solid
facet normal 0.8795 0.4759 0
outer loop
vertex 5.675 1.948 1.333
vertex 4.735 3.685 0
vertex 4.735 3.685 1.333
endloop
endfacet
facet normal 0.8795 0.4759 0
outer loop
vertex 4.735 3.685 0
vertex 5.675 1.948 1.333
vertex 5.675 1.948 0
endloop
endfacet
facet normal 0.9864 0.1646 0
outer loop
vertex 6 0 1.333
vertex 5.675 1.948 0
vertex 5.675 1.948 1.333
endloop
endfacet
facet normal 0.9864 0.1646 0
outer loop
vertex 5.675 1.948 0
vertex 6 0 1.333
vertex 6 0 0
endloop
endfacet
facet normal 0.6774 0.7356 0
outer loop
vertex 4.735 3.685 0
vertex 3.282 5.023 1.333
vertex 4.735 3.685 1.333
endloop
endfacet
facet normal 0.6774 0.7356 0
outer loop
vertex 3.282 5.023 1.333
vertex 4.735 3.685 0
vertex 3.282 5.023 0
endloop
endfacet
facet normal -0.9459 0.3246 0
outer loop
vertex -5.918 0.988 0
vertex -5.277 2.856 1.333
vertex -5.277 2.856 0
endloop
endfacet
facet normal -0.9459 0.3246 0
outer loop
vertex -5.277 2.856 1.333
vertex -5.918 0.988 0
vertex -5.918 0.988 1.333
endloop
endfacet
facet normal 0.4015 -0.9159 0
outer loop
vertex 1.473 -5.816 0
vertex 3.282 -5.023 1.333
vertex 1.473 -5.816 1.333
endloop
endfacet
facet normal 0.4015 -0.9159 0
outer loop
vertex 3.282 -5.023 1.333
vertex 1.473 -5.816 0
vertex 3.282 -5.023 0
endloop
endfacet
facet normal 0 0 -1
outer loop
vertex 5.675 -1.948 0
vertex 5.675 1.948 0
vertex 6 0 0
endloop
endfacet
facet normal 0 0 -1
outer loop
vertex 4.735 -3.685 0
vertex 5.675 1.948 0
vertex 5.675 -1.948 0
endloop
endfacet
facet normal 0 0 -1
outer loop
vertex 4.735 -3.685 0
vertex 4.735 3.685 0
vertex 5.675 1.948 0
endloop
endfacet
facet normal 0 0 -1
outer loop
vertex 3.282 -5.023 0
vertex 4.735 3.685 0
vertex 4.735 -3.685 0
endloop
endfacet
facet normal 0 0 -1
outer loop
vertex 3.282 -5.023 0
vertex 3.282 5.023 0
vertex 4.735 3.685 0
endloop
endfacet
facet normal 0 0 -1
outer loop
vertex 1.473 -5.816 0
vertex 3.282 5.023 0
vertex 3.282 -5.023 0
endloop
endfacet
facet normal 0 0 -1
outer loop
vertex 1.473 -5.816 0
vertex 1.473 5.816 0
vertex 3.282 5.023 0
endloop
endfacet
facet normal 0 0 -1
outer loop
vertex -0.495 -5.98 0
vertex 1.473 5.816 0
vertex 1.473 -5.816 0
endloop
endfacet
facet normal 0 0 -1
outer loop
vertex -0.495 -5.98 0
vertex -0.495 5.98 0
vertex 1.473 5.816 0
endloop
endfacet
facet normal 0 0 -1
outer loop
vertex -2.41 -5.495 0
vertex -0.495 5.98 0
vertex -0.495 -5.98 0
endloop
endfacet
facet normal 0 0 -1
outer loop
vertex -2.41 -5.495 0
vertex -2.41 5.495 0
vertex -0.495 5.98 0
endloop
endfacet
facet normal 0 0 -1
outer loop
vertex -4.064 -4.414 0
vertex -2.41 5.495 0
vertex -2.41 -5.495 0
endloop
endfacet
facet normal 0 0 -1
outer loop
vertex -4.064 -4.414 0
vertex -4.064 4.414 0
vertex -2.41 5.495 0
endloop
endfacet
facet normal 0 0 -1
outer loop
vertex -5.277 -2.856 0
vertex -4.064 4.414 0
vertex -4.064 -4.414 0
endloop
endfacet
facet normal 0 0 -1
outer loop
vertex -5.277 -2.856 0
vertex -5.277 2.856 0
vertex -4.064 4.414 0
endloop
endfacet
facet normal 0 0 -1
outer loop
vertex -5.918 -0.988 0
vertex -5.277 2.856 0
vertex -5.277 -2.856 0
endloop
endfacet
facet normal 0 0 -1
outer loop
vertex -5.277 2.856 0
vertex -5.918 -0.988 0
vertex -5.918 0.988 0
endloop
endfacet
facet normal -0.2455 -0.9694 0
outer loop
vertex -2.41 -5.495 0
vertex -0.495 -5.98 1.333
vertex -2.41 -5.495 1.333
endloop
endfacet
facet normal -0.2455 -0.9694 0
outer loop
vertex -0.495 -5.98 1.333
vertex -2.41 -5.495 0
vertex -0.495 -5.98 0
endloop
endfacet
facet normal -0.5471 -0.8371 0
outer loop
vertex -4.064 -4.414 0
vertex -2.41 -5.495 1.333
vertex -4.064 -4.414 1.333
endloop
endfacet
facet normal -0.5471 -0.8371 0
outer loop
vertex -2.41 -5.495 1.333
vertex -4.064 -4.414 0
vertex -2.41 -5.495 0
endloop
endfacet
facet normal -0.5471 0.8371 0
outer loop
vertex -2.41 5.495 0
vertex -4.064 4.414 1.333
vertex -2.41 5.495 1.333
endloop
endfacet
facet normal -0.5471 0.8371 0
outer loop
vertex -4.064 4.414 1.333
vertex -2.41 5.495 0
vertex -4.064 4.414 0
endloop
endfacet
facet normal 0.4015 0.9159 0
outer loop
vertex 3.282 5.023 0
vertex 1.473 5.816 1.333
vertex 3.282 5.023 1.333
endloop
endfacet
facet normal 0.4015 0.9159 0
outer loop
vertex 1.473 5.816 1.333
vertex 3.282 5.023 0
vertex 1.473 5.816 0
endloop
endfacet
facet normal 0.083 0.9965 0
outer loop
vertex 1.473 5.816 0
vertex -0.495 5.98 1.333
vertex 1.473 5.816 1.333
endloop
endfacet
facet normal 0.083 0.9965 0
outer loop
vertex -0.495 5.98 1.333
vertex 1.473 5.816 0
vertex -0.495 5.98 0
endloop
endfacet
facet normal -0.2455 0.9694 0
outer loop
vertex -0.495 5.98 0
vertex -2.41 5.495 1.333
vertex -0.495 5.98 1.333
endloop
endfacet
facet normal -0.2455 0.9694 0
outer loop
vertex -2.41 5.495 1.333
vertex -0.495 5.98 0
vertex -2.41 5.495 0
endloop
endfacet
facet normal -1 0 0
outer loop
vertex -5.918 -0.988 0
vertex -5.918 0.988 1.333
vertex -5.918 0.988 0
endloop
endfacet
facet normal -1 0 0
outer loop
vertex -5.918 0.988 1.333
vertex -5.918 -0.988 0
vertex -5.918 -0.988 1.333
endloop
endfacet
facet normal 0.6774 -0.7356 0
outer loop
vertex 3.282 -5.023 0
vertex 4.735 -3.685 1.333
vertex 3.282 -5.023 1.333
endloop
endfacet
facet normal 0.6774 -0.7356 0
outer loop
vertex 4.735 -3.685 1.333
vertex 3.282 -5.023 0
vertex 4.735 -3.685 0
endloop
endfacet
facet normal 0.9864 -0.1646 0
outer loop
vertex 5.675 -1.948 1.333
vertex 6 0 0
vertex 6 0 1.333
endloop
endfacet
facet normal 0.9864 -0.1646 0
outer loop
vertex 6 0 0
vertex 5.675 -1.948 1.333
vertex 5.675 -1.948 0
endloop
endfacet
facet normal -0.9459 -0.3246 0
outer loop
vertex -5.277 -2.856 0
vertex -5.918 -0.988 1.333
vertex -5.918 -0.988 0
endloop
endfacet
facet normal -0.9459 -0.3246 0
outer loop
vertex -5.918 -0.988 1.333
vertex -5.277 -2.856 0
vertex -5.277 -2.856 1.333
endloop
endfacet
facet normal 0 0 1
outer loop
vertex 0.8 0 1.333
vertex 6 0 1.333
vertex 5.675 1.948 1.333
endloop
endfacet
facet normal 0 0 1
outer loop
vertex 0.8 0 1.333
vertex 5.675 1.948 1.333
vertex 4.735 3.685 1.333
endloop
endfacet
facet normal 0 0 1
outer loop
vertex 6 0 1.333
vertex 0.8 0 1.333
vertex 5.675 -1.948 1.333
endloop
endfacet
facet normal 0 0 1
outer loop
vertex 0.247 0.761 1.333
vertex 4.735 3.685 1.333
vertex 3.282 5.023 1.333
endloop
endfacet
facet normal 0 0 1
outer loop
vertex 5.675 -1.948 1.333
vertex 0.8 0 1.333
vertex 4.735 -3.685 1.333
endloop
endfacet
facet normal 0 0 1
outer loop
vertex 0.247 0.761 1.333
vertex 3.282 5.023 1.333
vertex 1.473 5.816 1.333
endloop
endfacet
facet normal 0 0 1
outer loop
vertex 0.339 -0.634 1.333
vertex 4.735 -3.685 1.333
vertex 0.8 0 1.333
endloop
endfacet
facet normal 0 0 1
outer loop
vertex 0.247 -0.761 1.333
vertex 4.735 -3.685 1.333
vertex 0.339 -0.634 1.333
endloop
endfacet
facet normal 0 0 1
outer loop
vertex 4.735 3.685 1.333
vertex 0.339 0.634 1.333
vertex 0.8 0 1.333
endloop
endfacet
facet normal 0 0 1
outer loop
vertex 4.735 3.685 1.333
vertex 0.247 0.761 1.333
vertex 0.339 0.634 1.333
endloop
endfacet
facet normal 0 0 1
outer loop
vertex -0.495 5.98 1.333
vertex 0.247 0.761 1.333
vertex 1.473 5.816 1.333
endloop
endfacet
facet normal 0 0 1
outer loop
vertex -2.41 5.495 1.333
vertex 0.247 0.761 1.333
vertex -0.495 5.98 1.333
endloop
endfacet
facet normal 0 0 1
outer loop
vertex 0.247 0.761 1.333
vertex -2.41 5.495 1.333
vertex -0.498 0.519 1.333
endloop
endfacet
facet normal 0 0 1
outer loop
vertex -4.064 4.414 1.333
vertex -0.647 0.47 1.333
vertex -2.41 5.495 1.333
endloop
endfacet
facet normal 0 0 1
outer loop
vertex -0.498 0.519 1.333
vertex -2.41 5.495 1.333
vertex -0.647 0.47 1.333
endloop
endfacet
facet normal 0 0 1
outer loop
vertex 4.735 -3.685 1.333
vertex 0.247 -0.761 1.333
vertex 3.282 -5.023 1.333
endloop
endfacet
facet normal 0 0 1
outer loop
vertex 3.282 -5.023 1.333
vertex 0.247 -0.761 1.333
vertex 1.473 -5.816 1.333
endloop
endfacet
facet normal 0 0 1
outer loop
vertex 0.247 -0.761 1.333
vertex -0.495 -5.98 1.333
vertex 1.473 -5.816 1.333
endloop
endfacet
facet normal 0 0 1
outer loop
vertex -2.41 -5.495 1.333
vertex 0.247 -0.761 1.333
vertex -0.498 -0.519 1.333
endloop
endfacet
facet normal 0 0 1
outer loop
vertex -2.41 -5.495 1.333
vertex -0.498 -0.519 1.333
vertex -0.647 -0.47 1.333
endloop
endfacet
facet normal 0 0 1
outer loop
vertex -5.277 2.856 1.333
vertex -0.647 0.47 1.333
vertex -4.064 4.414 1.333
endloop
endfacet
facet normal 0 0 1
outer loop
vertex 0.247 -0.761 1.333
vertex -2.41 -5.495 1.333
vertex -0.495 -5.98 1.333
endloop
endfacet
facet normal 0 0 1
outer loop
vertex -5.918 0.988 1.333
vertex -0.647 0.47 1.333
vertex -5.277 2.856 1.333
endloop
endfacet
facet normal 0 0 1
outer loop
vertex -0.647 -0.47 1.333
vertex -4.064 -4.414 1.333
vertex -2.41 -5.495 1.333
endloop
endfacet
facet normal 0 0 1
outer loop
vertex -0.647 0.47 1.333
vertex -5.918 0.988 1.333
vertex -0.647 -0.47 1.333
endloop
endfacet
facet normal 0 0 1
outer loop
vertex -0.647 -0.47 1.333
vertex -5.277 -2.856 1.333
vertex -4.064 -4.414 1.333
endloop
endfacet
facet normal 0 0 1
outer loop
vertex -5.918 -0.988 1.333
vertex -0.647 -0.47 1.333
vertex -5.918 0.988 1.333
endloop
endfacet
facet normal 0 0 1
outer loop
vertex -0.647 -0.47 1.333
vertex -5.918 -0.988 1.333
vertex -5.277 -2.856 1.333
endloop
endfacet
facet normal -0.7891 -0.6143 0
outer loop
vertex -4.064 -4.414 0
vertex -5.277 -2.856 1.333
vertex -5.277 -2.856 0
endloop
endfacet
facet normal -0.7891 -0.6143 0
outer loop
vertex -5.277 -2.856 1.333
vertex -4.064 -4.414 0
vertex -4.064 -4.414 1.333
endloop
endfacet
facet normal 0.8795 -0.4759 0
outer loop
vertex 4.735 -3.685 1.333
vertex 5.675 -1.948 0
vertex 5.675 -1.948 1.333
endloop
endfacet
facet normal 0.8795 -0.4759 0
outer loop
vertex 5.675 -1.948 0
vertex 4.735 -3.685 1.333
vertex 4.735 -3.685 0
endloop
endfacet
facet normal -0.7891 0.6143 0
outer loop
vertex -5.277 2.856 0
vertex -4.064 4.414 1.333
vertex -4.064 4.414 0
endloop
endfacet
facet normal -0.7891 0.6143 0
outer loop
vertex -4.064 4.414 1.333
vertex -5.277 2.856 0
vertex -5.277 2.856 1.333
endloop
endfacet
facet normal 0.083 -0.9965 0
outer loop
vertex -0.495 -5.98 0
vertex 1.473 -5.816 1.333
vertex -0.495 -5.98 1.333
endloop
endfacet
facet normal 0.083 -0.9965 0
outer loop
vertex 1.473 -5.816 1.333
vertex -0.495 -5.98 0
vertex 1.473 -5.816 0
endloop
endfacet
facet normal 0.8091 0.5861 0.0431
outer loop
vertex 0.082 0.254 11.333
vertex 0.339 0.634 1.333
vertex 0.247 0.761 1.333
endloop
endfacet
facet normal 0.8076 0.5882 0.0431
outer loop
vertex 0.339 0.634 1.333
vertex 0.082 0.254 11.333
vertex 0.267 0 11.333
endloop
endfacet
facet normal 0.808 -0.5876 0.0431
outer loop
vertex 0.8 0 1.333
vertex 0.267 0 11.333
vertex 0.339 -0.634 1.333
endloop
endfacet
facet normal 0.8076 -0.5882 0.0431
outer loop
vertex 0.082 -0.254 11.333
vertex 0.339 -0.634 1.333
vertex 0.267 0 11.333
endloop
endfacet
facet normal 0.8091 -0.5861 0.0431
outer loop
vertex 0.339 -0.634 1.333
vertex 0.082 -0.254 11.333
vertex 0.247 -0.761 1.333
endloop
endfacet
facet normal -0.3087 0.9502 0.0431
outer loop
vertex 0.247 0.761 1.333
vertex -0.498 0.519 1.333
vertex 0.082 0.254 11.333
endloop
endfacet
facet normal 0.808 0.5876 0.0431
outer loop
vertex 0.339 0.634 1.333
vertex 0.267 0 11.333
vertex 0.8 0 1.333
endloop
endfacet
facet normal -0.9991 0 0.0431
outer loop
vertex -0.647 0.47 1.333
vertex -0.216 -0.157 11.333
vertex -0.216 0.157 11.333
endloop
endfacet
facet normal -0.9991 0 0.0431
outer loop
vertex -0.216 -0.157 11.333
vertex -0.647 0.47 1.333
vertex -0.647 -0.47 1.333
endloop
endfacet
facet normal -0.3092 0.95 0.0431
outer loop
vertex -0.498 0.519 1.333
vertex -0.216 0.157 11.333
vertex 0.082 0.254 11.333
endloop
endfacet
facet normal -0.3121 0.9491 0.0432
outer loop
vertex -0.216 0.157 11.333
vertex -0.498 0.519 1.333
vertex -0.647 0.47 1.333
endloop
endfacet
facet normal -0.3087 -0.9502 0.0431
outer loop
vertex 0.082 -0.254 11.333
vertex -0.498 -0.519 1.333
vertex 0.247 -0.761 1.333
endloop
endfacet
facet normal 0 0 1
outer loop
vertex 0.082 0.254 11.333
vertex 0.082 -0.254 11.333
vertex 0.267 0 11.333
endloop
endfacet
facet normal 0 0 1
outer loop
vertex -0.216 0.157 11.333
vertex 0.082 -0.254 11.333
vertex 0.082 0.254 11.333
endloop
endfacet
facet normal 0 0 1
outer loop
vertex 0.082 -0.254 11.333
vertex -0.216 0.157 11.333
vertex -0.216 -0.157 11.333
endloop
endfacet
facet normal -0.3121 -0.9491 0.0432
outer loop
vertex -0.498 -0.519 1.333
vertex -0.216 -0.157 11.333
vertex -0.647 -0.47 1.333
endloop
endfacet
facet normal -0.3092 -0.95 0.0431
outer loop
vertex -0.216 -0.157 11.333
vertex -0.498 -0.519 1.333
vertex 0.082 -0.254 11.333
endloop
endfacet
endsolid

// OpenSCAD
// This is mrbenbritton's cookie cutter script
// http://www.thingiverse.com/thing:28882

inputfile = "unicorn-contour.dxf";

wallThick = 2;
cutterMinimum = 0.4;
baseHeight = 4;
height = 10;
flangeWidth = 6;

//cube([7,5,1], center=true);

minkowski(){
	outline();
	cylinder(r1 = wallThick/3, r2 = cutterMinimum/3, h = height);
};
//%cube([.5, .5, height*3], true);

flange();

module flange(){
	difference(){
	minkowski(){
	baseShape(baseHeight/3);
	cylinder(r = flangeWidth, h = baseHeight/3);
	}
	translate([0,0,-0.01])baseShape(baseHeight*1.1);
	};
}



module outline(){
	difference(){
	minkowski(){
	baseShape(baseHeight/3);
	cylinder(r = cutterMinimum/3, h = baseHeight/3);
	}
	translate([0,0,-0.01])baseShape(baseHeight*1.1);
	};
};

module baseShape(H){
	linear_extrude(file = inputfile, height=H);
}
